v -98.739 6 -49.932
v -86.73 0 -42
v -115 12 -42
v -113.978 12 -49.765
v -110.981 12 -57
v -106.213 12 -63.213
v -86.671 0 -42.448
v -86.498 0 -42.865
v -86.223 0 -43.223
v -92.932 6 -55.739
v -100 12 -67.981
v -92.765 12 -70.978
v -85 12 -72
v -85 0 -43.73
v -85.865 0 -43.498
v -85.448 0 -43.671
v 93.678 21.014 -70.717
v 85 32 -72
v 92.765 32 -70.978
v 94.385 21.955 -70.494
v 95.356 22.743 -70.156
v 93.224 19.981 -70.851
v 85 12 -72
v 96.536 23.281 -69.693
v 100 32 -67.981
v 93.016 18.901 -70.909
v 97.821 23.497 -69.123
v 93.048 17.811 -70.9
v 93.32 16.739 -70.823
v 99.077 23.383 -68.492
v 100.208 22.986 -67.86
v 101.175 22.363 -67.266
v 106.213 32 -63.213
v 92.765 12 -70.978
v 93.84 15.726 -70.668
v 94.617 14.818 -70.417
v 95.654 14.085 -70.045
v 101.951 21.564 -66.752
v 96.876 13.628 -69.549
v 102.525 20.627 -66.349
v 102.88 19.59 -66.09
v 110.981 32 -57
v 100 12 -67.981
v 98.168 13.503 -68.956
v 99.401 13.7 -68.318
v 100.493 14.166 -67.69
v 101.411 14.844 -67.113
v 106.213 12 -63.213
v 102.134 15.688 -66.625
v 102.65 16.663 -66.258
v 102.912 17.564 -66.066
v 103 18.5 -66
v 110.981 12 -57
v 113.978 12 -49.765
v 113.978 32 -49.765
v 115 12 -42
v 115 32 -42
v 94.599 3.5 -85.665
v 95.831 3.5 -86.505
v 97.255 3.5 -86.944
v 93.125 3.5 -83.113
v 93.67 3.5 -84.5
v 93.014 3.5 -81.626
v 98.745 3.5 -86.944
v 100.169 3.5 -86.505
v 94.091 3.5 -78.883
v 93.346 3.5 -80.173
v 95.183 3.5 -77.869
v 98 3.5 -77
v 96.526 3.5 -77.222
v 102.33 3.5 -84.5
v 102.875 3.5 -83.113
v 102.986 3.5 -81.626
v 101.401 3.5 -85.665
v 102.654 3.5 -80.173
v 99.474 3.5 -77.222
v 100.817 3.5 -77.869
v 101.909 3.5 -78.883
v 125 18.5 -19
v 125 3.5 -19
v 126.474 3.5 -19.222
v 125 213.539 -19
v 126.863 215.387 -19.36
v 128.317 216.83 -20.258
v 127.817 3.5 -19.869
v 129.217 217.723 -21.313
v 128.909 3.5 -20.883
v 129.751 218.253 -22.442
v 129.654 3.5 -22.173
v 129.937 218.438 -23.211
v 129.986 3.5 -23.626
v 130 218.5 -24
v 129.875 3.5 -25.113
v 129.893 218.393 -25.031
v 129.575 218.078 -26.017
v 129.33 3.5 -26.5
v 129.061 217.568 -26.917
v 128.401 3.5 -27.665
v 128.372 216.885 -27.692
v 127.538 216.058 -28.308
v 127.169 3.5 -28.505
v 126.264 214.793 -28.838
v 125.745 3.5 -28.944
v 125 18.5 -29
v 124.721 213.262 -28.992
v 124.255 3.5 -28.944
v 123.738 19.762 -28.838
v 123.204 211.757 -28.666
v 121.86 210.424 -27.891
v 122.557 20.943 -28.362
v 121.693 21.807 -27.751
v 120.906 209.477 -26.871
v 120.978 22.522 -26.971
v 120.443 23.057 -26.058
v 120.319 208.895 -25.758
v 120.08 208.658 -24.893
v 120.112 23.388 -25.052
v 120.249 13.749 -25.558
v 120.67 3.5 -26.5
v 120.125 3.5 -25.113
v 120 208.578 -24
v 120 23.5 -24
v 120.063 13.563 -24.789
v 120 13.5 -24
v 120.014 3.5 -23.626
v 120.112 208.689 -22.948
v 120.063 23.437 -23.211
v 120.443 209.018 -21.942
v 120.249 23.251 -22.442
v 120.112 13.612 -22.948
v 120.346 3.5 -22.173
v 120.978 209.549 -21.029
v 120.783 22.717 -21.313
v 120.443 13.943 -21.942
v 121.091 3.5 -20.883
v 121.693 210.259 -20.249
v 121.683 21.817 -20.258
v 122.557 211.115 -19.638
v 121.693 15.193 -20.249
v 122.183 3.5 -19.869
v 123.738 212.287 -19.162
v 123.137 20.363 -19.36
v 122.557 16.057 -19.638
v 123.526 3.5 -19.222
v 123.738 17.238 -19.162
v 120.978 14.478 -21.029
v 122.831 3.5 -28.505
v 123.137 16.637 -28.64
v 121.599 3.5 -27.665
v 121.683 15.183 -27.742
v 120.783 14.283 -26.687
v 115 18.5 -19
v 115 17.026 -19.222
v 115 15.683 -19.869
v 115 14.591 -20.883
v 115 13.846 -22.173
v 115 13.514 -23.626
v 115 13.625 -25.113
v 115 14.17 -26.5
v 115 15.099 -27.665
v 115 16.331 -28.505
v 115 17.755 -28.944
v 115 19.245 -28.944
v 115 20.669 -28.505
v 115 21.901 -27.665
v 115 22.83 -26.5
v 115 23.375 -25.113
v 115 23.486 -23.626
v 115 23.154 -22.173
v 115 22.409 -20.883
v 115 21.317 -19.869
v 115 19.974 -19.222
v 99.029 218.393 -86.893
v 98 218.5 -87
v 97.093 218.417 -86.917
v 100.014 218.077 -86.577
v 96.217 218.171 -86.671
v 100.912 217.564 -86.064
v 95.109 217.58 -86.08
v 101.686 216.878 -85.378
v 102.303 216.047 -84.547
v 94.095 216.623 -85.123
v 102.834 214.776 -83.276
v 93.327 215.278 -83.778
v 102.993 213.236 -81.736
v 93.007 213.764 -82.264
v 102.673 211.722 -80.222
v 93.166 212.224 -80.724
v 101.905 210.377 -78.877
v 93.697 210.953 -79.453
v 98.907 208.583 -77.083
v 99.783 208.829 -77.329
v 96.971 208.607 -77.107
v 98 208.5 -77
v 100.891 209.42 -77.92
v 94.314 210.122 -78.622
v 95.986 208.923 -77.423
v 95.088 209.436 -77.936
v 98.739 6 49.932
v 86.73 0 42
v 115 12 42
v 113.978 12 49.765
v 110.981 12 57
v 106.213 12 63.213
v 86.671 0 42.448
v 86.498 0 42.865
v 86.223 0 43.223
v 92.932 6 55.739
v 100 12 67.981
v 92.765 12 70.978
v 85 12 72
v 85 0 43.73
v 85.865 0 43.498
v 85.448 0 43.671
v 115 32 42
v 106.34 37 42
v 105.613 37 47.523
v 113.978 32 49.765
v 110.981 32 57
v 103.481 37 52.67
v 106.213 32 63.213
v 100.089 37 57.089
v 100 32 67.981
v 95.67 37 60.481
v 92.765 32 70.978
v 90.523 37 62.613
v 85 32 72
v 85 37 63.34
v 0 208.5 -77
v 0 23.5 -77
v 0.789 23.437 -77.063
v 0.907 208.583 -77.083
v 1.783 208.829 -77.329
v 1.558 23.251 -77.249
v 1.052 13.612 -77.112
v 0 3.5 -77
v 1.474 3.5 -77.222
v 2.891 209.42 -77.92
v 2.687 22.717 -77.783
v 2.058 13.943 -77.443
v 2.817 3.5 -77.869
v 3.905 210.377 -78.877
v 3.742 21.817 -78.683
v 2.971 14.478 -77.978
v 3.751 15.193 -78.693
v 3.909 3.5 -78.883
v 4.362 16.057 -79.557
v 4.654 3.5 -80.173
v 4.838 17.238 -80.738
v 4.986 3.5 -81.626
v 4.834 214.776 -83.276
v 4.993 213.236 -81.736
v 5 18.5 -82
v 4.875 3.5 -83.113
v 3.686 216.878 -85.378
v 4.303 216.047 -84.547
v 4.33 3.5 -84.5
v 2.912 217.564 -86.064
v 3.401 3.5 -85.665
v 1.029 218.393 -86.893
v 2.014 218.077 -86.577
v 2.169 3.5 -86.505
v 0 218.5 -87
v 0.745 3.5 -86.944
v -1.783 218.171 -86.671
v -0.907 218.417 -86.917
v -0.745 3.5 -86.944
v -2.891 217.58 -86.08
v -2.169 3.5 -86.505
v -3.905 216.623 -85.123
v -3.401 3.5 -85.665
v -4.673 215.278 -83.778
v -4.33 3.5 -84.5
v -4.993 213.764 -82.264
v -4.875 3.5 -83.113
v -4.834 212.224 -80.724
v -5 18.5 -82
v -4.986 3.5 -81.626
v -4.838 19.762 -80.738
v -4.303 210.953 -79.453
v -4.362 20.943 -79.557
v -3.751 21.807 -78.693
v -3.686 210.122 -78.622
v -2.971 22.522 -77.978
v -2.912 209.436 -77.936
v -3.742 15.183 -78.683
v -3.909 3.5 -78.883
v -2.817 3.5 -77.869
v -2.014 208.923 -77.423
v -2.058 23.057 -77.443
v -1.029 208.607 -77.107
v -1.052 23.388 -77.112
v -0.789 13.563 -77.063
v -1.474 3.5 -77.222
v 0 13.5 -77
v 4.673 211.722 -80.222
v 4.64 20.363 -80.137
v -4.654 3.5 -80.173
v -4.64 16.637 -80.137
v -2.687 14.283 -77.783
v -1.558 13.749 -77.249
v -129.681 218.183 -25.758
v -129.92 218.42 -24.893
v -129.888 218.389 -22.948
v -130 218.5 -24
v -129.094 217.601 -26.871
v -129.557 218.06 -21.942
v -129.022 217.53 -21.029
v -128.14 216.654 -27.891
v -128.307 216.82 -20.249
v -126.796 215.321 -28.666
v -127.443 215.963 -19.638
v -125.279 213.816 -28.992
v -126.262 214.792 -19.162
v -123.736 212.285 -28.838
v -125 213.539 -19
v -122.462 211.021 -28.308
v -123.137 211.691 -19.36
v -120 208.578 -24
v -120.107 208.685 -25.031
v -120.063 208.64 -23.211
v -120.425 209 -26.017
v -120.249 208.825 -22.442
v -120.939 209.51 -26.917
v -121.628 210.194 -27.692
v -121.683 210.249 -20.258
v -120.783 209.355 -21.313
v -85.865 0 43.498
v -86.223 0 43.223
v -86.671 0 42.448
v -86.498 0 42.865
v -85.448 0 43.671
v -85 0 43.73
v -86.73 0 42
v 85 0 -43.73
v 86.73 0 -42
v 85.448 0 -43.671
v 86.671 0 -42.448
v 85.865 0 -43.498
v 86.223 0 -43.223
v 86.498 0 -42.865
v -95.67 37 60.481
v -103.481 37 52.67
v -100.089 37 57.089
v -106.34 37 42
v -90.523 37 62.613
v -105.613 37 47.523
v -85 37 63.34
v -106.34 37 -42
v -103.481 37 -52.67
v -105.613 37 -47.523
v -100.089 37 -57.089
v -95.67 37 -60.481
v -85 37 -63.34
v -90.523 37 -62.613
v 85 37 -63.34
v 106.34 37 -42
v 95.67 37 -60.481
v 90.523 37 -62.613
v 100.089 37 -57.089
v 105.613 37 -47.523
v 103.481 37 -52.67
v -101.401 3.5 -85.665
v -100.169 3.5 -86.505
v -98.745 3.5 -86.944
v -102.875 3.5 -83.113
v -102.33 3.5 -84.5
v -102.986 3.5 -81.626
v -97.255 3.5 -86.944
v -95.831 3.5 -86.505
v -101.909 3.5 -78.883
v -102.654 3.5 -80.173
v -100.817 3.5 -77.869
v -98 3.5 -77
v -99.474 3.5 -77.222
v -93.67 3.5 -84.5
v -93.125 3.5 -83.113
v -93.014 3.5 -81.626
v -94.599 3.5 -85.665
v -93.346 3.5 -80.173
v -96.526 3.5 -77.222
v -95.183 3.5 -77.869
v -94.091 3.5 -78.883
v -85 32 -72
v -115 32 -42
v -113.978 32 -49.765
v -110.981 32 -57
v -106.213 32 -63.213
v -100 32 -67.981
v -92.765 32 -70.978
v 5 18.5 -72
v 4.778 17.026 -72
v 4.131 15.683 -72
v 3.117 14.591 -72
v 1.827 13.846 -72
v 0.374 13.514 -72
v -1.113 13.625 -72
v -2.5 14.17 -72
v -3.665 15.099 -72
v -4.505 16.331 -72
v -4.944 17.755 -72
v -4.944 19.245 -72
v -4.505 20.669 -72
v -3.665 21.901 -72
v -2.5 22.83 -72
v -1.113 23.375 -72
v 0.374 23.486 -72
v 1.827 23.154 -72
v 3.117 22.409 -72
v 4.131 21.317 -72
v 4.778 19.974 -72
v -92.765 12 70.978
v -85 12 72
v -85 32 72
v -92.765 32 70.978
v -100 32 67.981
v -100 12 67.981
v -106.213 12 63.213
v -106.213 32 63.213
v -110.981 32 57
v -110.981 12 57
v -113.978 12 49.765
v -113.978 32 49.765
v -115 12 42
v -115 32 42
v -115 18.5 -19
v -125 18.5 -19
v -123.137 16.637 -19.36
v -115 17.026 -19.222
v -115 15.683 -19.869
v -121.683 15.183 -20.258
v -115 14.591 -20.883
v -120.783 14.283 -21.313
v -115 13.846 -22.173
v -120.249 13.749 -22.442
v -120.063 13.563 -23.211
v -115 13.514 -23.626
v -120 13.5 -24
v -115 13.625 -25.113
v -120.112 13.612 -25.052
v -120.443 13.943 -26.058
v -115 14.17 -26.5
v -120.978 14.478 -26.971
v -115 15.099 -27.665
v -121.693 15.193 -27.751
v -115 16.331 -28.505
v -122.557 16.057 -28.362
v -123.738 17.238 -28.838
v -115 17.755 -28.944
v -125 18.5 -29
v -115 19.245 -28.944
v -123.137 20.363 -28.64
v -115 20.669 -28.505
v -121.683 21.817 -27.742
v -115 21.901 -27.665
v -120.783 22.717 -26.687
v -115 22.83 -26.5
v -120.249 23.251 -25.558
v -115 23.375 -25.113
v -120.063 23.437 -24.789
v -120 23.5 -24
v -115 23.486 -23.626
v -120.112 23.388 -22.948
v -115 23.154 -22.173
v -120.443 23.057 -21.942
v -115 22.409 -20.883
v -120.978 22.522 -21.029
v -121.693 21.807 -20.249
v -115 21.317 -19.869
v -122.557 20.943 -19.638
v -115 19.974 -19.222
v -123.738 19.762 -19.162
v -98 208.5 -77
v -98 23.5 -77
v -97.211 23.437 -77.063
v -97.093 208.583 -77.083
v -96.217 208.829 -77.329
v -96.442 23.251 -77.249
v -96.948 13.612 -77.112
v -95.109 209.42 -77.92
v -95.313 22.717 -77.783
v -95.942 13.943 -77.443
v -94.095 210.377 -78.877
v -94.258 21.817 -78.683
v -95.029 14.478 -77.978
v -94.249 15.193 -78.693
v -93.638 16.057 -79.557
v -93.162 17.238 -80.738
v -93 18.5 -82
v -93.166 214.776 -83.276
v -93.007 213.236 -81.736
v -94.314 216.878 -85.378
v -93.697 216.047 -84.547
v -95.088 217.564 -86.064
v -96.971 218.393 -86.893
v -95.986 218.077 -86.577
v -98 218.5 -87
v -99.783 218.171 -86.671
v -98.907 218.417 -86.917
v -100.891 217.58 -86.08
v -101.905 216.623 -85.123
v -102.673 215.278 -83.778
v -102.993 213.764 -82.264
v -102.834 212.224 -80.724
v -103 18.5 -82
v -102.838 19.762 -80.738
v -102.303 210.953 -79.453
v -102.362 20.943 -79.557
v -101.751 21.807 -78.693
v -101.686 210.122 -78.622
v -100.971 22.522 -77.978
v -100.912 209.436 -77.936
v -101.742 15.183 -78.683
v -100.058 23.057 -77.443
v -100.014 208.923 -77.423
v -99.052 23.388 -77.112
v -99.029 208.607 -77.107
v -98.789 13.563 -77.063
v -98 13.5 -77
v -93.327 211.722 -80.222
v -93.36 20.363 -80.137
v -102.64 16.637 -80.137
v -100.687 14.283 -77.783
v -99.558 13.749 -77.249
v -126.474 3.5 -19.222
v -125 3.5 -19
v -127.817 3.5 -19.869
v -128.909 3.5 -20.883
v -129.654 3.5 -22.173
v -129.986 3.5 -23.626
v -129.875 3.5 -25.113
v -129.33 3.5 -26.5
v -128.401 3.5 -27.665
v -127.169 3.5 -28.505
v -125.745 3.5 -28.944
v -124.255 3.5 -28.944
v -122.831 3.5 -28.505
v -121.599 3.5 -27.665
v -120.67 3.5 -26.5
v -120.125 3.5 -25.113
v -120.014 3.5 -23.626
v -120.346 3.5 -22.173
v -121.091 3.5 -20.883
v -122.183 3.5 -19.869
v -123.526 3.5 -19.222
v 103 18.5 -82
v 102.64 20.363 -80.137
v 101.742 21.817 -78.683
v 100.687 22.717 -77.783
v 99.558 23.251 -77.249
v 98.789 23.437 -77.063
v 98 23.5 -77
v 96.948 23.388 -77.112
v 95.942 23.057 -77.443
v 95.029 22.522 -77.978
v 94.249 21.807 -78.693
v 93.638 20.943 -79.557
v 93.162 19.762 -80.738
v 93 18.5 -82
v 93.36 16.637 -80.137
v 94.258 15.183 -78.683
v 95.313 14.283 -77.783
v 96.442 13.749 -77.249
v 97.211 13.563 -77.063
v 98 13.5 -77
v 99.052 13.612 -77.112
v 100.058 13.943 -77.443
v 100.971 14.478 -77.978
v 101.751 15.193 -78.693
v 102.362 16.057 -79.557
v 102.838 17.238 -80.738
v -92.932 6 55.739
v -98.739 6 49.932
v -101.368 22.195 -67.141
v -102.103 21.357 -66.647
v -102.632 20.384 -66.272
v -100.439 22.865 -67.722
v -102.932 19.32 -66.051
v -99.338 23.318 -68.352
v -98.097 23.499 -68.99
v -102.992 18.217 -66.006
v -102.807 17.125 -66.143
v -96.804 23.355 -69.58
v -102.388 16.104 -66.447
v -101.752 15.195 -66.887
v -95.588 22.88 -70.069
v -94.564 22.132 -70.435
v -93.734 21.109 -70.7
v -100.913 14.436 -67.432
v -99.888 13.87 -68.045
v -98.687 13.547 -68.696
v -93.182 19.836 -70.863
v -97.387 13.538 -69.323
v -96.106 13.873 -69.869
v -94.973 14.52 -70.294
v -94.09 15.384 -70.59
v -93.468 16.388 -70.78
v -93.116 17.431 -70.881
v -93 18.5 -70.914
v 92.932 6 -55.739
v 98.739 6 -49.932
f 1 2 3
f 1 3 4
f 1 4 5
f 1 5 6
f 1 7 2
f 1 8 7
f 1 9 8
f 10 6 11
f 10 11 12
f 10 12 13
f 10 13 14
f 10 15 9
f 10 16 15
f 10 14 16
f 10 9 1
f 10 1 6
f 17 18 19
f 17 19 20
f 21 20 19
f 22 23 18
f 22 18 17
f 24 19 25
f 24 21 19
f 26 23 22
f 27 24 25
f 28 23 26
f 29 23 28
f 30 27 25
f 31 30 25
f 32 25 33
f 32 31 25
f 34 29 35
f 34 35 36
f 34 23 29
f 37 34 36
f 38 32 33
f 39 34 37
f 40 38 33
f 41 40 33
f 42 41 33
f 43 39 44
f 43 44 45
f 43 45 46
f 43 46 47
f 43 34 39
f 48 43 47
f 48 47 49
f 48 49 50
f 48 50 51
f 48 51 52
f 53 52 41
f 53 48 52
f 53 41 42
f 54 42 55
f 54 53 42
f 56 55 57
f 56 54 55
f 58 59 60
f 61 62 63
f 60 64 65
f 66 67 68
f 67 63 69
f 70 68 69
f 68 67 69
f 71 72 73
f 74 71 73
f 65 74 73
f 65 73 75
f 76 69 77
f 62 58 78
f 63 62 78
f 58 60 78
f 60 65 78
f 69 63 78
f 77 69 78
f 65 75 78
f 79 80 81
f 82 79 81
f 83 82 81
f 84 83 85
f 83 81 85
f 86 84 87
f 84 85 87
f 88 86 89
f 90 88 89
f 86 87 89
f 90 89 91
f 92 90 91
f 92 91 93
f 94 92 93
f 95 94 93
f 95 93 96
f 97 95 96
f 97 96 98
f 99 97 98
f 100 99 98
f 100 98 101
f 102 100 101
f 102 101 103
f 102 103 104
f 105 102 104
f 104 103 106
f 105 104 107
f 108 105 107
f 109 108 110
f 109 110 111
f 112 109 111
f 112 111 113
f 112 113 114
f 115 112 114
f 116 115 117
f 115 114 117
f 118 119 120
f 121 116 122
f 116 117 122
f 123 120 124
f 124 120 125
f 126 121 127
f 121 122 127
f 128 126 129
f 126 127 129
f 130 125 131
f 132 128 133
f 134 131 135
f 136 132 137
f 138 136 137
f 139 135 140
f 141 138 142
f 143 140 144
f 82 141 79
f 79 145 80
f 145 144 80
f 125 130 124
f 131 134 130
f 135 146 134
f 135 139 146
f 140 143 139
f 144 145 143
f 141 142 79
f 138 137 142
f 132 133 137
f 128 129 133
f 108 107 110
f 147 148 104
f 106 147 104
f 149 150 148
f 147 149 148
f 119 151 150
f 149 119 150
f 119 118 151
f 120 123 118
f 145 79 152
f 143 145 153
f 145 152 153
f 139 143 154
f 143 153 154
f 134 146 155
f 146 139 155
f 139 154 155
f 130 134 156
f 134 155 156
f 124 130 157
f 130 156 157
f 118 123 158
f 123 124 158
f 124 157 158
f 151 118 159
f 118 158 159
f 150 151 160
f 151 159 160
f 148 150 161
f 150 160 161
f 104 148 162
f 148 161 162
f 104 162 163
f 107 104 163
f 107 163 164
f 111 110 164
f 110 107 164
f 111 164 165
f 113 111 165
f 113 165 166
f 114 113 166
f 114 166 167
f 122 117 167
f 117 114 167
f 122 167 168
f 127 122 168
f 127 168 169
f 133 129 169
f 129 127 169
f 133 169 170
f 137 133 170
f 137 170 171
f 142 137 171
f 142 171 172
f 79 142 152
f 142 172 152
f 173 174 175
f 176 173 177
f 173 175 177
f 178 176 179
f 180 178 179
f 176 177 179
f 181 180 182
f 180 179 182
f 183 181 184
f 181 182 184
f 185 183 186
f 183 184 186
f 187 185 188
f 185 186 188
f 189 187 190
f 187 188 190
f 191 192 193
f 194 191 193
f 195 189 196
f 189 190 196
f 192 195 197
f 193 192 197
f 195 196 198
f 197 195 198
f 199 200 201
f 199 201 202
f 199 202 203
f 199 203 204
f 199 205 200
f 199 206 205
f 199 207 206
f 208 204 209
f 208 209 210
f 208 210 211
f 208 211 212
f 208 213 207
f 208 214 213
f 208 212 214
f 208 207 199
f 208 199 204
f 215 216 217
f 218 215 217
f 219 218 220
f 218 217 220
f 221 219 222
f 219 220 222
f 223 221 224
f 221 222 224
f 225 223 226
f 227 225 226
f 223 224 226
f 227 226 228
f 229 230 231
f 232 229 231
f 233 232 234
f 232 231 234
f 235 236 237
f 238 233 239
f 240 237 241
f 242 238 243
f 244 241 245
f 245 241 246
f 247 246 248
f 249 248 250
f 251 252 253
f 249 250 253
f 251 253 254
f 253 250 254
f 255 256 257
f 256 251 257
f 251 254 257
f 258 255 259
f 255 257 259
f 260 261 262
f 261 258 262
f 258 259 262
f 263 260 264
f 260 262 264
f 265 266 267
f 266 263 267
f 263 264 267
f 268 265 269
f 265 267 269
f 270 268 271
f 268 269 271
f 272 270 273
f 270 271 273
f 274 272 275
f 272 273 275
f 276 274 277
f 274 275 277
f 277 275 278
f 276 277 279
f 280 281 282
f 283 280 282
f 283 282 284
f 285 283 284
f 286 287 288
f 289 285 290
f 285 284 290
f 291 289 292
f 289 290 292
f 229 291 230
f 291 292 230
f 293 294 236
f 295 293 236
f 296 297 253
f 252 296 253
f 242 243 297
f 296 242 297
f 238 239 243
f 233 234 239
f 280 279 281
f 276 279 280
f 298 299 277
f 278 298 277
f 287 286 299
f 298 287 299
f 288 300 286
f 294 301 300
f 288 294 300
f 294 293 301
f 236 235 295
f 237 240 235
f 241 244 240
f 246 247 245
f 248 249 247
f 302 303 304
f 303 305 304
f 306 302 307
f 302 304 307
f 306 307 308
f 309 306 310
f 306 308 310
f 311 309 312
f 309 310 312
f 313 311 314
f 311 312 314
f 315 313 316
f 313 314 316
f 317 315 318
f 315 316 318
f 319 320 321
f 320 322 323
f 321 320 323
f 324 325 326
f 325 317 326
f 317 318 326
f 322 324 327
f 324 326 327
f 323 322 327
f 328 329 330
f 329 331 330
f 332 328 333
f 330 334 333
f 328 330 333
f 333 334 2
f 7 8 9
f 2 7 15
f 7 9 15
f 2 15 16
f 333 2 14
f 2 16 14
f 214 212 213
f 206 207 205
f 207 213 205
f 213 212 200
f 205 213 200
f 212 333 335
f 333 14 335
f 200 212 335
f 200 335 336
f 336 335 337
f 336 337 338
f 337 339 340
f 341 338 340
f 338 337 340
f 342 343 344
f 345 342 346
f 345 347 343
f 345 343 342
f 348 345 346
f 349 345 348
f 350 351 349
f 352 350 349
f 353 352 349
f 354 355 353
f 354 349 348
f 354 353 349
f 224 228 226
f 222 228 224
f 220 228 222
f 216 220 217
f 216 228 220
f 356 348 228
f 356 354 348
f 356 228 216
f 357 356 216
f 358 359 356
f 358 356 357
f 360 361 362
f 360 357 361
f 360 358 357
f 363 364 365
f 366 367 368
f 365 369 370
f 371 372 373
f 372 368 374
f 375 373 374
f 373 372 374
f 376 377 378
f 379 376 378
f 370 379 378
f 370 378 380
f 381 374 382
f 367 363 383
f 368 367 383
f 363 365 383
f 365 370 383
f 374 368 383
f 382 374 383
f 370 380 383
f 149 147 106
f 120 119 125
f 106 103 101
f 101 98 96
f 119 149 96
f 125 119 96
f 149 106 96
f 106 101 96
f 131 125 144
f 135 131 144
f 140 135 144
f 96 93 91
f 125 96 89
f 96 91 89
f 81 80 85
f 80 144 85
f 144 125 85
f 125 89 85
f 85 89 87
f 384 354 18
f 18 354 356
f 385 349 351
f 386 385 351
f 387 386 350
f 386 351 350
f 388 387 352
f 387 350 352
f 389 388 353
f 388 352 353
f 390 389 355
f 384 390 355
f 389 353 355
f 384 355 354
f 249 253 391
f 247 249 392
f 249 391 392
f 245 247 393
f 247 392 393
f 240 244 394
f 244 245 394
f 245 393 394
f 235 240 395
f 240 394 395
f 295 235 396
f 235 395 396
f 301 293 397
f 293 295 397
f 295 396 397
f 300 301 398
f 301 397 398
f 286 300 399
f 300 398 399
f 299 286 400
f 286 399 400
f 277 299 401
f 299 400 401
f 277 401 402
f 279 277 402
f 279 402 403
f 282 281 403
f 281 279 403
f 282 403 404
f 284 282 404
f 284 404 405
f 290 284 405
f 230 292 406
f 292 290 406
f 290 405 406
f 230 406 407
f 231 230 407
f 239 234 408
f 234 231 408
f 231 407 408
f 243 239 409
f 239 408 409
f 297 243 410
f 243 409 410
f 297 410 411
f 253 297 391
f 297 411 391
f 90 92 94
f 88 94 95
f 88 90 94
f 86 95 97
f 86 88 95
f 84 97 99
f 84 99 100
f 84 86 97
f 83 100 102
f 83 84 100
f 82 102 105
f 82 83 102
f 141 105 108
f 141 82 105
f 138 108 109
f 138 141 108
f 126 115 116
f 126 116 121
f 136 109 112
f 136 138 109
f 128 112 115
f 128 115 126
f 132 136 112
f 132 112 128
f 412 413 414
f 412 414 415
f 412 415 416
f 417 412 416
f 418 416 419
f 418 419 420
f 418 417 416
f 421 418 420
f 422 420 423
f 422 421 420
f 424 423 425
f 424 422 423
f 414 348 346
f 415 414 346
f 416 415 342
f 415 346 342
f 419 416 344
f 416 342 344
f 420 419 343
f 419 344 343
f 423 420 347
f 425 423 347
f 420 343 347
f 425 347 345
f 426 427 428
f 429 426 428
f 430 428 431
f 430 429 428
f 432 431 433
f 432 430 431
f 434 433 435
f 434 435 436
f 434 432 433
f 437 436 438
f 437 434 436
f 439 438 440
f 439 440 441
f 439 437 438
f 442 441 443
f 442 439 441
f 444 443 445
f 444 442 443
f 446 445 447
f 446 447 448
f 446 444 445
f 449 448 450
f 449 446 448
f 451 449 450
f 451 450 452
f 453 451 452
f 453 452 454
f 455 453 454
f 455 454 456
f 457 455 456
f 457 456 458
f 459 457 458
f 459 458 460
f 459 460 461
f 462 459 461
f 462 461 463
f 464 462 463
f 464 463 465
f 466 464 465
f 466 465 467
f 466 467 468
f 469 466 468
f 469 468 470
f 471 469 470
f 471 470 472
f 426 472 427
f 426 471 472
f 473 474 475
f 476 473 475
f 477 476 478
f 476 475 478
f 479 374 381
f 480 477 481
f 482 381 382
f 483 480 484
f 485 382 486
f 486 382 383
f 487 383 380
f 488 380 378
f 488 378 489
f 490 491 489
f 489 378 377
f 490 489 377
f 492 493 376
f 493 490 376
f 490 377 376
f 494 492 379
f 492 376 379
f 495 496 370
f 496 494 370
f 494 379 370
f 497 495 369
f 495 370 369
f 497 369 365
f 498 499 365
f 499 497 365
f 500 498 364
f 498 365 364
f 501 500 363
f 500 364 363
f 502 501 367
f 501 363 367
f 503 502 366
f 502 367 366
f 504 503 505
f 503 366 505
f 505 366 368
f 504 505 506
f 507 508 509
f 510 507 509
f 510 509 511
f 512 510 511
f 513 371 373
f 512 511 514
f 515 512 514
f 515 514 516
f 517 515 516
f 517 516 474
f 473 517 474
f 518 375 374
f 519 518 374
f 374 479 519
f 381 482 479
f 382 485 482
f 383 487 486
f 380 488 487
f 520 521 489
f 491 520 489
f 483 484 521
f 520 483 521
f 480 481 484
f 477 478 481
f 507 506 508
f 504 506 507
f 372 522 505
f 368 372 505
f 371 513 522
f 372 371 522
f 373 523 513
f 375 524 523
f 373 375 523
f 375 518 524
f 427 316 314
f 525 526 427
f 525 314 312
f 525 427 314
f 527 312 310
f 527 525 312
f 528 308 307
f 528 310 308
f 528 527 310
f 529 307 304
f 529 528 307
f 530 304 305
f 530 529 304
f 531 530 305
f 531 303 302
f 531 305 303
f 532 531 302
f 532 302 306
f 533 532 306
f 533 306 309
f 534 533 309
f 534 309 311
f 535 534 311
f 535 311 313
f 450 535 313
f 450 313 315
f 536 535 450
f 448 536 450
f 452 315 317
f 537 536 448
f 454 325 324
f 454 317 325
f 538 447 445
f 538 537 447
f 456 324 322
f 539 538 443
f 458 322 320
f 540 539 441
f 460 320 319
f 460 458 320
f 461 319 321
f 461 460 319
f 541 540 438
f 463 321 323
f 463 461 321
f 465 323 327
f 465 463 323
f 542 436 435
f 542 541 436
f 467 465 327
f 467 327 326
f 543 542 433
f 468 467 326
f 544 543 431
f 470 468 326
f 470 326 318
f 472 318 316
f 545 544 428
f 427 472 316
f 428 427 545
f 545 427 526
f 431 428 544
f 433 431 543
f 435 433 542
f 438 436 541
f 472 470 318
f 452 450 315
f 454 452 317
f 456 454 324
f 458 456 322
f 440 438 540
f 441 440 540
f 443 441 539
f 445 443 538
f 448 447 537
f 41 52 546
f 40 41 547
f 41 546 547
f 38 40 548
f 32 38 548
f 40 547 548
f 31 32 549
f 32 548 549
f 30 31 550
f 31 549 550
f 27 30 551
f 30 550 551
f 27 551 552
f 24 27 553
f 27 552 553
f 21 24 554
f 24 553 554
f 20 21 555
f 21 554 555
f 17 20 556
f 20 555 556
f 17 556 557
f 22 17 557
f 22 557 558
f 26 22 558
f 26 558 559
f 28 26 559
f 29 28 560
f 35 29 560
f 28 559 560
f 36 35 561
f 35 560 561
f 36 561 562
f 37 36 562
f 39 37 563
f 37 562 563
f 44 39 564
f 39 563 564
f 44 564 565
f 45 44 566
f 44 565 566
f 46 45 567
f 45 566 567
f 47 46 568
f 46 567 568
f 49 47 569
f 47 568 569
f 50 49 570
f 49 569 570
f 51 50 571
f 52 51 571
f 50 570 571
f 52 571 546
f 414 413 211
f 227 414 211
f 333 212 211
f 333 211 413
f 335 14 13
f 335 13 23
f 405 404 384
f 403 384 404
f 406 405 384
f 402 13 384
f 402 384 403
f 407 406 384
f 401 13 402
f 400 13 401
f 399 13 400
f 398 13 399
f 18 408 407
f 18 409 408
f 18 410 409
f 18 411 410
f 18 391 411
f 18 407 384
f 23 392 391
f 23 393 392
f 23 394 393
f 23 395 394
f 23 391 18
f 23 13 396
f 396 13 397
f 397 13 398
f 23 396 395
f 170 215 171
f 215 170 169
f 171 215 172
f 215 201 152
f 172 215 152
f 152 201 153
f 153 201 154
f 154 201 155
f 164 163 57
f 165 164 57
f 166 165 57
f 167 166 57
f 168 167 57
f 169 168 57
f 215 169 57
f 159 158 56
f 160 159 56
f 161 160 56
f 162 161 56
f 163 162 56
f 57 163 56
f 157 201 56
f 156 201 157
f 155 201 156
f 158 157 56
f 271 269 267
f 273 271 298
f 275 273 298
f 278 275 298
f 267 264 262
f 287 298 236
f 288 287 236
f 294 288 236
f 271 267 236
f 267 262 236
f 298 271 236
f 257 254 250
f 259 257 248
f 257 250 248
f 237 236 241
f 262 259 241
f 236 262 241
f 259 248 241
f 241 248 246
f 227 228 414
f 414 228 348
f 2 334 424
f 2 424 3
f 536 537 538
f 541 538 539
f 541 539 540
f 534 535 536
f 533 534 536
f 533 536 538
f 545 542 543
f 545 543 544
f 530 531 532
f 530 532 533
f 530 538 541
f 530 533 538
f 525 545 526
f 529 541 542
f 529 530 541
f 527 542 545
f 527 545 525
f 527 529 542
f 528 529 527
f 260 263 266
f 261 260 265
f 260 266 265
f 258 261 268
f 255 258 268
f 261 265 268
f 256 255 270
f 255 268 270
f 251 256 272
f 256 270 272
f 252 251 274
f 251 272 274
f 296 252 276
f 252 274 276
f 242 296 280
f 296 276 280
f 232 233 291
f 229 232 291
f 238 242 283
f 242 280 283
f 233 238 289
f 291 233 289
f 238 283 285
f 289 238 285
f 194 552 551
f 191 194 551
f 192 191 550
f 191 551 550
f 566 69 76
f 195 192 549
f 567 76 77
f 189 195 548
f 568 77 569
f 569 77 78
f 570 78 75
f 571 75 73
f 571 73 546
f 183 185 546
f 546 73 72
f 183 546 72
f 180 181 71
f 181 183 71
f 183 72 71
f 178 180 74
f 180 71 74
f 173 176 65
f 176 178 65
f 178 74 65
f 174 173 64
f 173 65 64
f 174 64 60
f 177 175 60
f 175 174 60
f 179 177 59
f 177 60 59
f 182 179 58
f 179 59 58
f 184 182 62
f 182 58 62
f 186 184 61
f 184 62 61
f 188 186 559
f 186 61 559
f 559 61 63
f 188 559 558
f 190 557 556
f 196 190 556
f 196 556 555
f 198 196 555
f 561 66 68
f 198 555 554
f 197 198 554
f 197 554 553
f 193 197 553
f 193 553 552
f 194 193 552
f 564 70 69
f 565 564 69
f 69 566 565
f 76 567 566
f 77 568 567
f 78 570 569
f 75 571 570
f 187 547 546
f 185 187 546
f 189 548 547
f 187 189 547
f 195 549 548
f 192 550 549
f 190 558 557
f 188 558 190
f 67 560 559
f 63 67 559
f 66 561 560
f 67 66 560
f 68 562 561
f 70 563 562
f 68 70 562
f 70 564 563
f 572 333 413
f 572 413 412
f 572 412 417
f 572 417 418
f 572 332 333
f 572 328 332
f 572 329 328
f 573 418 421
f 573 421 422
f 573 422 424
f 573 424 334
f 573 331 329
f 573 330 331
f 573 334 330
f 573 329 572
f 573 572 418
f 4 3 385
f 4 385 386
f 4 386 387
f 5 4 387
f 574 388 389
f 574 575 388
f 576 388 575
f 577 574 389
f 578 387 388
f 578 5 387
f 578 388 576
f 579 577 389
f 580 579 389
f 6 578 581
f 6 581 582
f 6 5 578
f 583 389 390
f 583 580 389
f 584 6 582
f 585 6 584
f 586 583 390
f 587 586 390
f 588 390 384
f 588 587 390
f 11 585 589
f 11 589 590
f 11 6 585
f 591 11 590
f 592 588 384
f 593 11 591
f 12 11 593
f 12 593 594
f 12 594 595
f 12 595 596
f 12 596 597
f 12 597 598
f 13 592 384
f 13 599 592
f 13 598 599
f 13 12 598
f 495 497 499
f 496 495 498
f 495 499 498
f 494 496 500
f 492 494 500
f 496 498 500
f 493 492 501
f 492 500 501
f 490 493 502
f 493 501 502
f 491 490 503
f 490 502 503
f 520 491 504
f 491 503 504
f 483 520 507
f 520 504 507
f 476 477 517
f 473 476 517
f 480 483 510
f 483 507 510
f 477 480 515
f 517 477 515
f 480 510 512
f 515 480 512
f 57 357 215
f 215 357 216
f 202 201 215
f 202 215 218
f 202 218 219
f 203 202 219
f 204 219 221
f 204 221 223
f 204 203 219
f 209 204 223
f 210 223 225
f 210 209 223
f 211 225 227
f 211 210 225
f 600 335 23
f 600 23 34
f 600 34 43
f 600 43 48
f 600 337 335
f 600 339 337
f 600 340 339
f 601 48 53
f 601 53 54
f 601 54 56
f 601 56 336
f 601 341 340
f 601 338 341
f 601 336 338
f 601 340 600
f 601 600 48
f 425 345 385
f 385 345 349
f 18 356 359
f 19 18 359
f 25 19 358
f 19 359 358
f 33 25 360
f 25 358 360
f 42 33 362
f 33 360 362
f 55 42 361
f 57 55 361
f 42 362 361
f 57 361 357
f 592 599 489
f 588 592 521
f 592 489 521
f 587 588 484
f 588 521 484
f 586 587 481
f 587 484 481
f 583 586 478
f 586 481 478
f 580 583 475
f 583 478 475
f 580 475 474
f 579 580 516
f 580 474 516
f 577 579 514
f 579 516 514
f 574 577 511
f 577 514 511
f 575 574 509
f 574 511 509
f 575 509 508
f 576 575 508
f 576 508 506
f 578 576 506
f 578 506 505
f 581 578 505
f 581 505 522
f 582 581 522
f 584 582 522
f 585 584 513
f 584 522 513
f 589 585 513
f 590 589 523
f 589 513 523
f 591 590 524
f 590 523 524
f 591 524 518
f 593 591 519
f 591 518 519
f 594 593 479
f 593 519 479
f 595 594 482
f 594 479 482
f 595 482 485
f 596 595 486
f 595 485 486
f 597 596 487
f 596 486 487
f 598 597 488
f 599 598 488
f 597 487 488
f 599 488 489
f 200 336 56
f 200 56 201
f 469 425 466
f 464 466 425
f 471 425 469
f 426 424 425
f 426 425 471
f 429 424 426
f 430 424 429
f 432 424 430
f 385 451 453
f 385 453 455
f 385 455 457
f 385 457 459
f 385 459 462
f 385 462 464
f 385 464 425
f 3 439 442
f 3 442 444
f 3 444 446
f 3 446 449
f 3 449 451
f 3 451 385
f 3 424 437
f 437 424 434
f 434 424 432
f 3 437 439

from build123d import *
from OCP.BRepFilletAPI import BRepFilletAPI_MakeChamfer

# Parameters (mm, degrees)
ESBO_O1_W                     = 230
ESBO_O1_H                     = 144
RESSALTO_EXTRUS_O1_DEPTH      = 37
ESBO_O2_R                     = 5
RESSALTO_EXTRUS_O2_DEPTH      = 10
RESSALTO_EXTRUS_O3_START      = -15
ESBO_O3_R                     = 5
RESSALTO_EXTRUS_O3_DEPTH      = 215
CORTE_EXTRUS_O1_DEPTH         = 56
ESBO_O6_R                     = 5
RESSALTO_EXTRUS_O4_DEPTH      = 10
RESSALTO_EXTRUS_O5_DEPTH      = 200
RESSALTO_EXTRUS_O5_DEPTH_BACK = 15
ESBO_O7_R                     = 5
CORTE_EXTRUS_O2_DEPTH         = 200
CORTE_EXTRUS_O2_DEPTH_BACK    = 200
FILETE1_START                 = -1
FILETE1_DEPTH                 = 39
FILETE1_START_2               = 23.5000001
FILETE1_2_DEPTH               = 14.4999999
FILETE1_3_DEPTH               = 14.499999761
FILETE1_START_3               = 23.281176651
FILETE1_4_DEPTH               = 9.810883349
FILETE1_START_4               = 13.499999761
FILETE1_5_DEPTH               = 9.78117689
FILETE1_6_DEPTH               = 0.218823449
FILETE1_START_5               = -72
FILETE1_7_OUTLINE_R           = 5
FILETE1_7_DEPTH               = 30
CHANFRO1_SIZE                 = 5
CHANFRO1_SIZE2                = 8.660254038
CHANFRO2_SIZE                 = 12
CHANFRO2_SIZE2                = 28.27022839


with BuildPart() as part:
    # Esboço1 → Ressalto-extrusão1 (new body)
    with BuildSketch(Plane(origin=(0, 0, 0), x_dir=(1, 0, 0), z_dir=(0, 1, 0))):
        Rectangle(ESBO_O1_W, ESBO_O1_H)
    extrude(amount=RESSALTO_EXTRUS_O1_DEPTH)

    # Esboço2 → Ressalto-extrusão2 (add)
    with BuildSketch(Plane(origin=(115, 0, 0), x_dir=(0, 0, -1), z_dir=(1, 0, 0))):
        with Locations(Location((24, 18.5, 0), (0, 0, 180))):
            Circle(ESBO_O2_R)
    ressalto_extrus_o2 = extrude(amount=RESSALTO_EXTRUS_O2_DEPTH)

    # Esboço3 → Ressalto-extrusão3 (add)
    with BuildSketch(Plane(origin=(0, 18.5, 0), x_dir=(1, 0, 0), z_dir=(0, 1, 0)).offset(RESSALTO_EXTRUS_O3_START)):
        with Locations(Location((125, 24, 0), (0, 0, 270))):
            Circle(ESBO_O3_R)
    ressalto_extrus_o3 = extrude(amount=RESSALTO_EXTRUS_O3_DEPTH)

    # Esboço4 → Corte-extrusão1 (cut)
    with BuildSketch(Plane.XY):
        Polygon((130, 218.5), (120, 208.57834268), (120, 218.5), align=None)
    corte_extrus_o1 = extrude(amount=-CORTE_EXTRUS_O1_DEPTH, mode=Mode.SUBTRACT)

    # Espelhar1: Ressalto-extrusão2, Ressalto-extrusão3, Corte-extrusão1 across plane
    add(ressalto_extrus_o2.mirror(Plane(origin=(0, 0, 0), x_dir=(0, 0, 1), z_dir=(1, 0, 0))))
    add(ressalto_extrus_o3.mirror(Plane(origin=(0, 0, 0), x_dir=(0, 0, 1), z_dir=(1, 0, 0))))
    add(corte_extrus_o1.mirror(Plane(origin=(0, 0, 0), x_dir=(0, 0, 1), z_dir=(1, 0, 0))), mode=Mode.SUBTRACT)

    # Esboço6 → Ressalto-extrusão4 (add)
    with BuildSketch(Plane(origin=(0, 0, -72), x_dir=(-1, 0, 0), z_dir=(0, 0, -1))):
        with Locations(Location((-98, 18.5, 0), (0, 0, 180))):
            Circle(ESBO_O6_R)
        with Locations(Location((0, 18.5, 0), (0, 0, 180))):
            Circle(ESBO_O6_R)
        with Locations(Location((98, 18.5, 0), (0, 0, 180))):
            Circle(ESBO_O6_R)
    extrude(amount=RESSALTO_EXTRUS_O4_DEPTH)

    # Esboço7 → Ressalto-extrusão5 (add, two sides: drawn at the far end of the back side and taken through both)
    with BuildSketch(Plane(origin=(0, 18.5, 0), x_dir=(1, 0, 0), z_dir=(0, 1, 0)).offset(-RESSALTO_EXTRUS_O5_DEPTH_BACK)):
        with Locations(Location((-98, 82, 0), (0, 0, 270))):
            Circle(ESBO_O7_R)
        with Locations(Location((0, 82, 0), (0, 0, 270))):
            Circle(ESBO_O7_R)
        with Locations(Location((98, 82, 0), (0, 0, 270))):
            Circle(ESBO_O7_R)
    extrude(amount=RESSALTO_EXTRUS_O5_DEPTH + RESSALTO_EXTRUS_O5_DEPTH_BACK)

    # Esboço8 → Corte-extrusão2 (cut, two sides: drawn at the far end of the back side and taken through both)
    with BuildSketch(Plane(origin=(0, 0, 0), x_dir=(0, 0, -1), z_dir=(1, 0, 0)).offset(-CORTE_EXTRUS_O2_DEPTH_BACK)):
        Polygon((87, 218.5), (77, 208.5), (77, 218.5), align=None)
    extrude(amount=CORTE_EXTRUS_O2_DEPTH + CORTE_EXTRUS_O2_DEPTH_BACK, mode=Mode.SUBTRACT)

    # Filete1: read off the stored shape, not the designer's step
    # Filete1 outline → Filete1 (cut)
    with BuildSketch(Plane(origin=(0, 0, 0), x_dir=(1, 0, 0), z_dir=(0, 1, 0)).offset(FILETE1_START)):
        with BuildLine():
            ThreePointArc((-85, -72), (-106.213203436, -63.213203436), (-115, -42))
            Line((-115, -42), (-115, -72))
            Line((-115, -72), (-85, -72))
        make_face()
        with BuildLine():
            ThreePointArc((115, -42), (106.213203436, -63.213203436), (85, -72))
            Line((85, -72), (115, -72))
            Line((115, -72), (115, -42))
        make_face()
    extrude(amount=FILETE1_DEPTH, mode=Mode.SUBTRACT)

    # Filete1 2 outline → Filete1 2 (cut)
    with BuildSketch(Plane(origin=(0, 0, 0), x_dir=(1, 0, 0), z_dir=(0, 1, 0)).offset(FILETE1_START_2)):
        with BuildLine():
            Line((-115, 72), (-115, 42))
            ThreePointArc((-115, 42), (-106.213203436, 63.213203436), (-85, 72))
            Line((-85, 72), (-115, 72))
        make_face()
        with BuildLine():
            Line((115, 72), (85, 72))
            ThreePointArc((85, 72), (106.213203436, 63.213203436), (115, 42))
            Line((115, 42), (115, 72))
        make_face()
    extrude(amount=FILETE1_2_DEPTH, mode=Mode.SUBTRACT)

    # Filete1 3 outline → Filete1 3 (cut)
    with BuildSketch(Plane(origin=(0, 0, 0), x_dir=(1, 0, 0), z_dir=(0, 1, 0)).offset(FILETE1_START)):
        with BuildLine():
            Line((-115, 72), (-115, 42))
            ThreePointArc((-115, 42), (-106.213203436, 63.213203436), (-85, 72))
            Line((-85, 72), (-115, 72))
        make_face()
        with BuildLine():
            Line((115, 72), (85, 72))
            ThreePointArc((85, 72), (106.213203436, 63.213203436), (115, 42))
            Line((115, 42), (115, 72))
        make_face()
    extrude(amount=FILETE1_3_DEPTH, mode=Mode.SUBTRACT)

    # Filete1 4 outline → Filete1 4 (cut)
    with BuildSketch(Plane(origin=(0, 0, 0), x_dir=(1, 0, 0), z_dir=(0, 1, 0)).offset(FILETE1_START_3)):
        with BuildLine():
            Line((115, 72), (85, 72))
            ThreePointArc((85, 72), (106.213203436, 63.213203436), (115, 42))
            Line((115, 42), (115, 72))
        make_face()
    extrude(amount=FILETE1_4_DEPTH, mode=Mode.SUBTRACT)

    # Filete1 5 outline → Filete1 5 (cut)
    with BuildSketch(Plane(origin=(0, 0, 0), x_dir=(1, 0, 0), z_dir=(0, 1, 0)).offset(FILETE1_START_4)):
        with BuildLine():
            Line((-115, 72), (-115, 42))
            ThreePointArc((-115, 42), (-106.213203436, 63.213203436), (-85, 72))
            Line((-85, 72), (-115, 72))
        make_face()
        with BuildLine():
            Line((115, 72), (85, 72))
            ThreePointArc((85, 72), (106.213203436, 63.213203436), (115, 42))
            Line((115, 42), (115, 72))
        make_face()
    extrude(amount=FILETE1_5_DEPTH, mode=Mode.SUBTRACT)

    # Filete1 6 outline → Filete1 6 (cut)
    with BuildSketch(Plane(origin=(0, 0, 0), x_dir=(1, 0, 0), z_dir=(0, 1, 0)).offset(FILETE1_START_3)):
        with BuildLine():
            Line((-115, 72), (-115, 42))
            ThreePointArc((-115, 42), (-106.213203436, 63.213203436), (-85, 72))
            Line((-85, 72), (-115, 72))
        make_face()
    extrude(amount=FILETE1_6_DEPTH, mode=Mode.SUBTRACT)

    # Filete1 7 outline → Filete1 7 (add)
    with BuildSketch(Plane.XY.offset(FILETE1_START_5)):
        with Locations((98, 18.5)):
            Circle(FILETE1_7_OUTLINE_R)
        with Locations((-98, 18.5)):
            Circle(FILETE1_7_OUTLINE_R)
    extrude(amount=FILETE1_7_DEPTH)

    # Chanfro1: one chamfer whose edges measure the first distance from different faces: ONE call of the kernel's chamfer builder (chamfer() names one face for all edges)
    chanfro1_edges_1 = [part.edges().sort_by_distance(p)[0] for p in [
        (-115, 37, 0),
    ]]
    chanfro1_side_1 = [part.faces().sort_by_distance(p)[0] for p in [
        (-115, 18.5, 0.622208406),
    ]]
    chanfro1_edges_2 = [part.edges().sort_by_distance(p)[0] for p in [
        (0, 37, -72),
    ]]
    chanfro1_side_2 = [part.faces().sort_by_distance(p)[0] for p in [
        (0, 1.739798839, -72),
    ]]
    chanfro1_edges_3 = [part.edges().sort_by_distance(p)[0] for p in [
        (0, 37, 72),
    ]]
    chanfro1_side_3 = [part.faces().sort_by_distance(p)[0] for p in [
        (0, 18.5, 72),
    ]]
    chanfro1_edges_4 = [part.edges().sort_by_distance(p)[0] for p in [
        (115, 37, 0),
    ]]
    chanfro1_side_4 = [part.faces().sort_by_distance(p)[0] for p in [
        (115, 18.5, 0.622208406),
    ]]
    chanfro1_edges_5 = [part.edges().sort_by_distance(p)[0] for p in [
        (-106.213203436, 37, 63.213203436),
    ]]
    chanfro1_side_5 = [part.faces().sort_by_distance(p)[0] for p in [
        (-106.213203436, 18.5, 63.213203436),
    ]]
    chanfro1_edges_6 = [part.edges().sort_by_distance(p)[0] for p in [
        (106.213203436, 37, 63.213203436),
    ]]
    chanfro1_side_6 = [part.faces().sort_by_distance(p)[0] for p in [
        (106.213203436, 18.5, 63.213203436),
    ]]
    chanfro1_edges_7 = [part.edges().sort_by_distance(p)[0] for p in [
        (106.213203436, 37, -63.213203436),
    ]]
    chanfro1_side_7 = [part.faces().sort_by_distance(p)[0] for p in [
        (106.213203436, 18.5, -63.213203436),
    ]]
    chanfro1_edges_8 = [part.edges().sort_by_distance(p)[0] for p in [
        (-106.213203436, 37, -63.213203436),
    ]]
    chanfro1_side_8 = [part.faces().sort_by_distance(p)[0] for p in [
        (-106.213203436, 18.5, -63.213203436),
    ]]
    chanfro1 = BRepFilletAPI_MakeChamfer(part.part.solid().wrapped)
    for e in chanfro1_edges_1:
        chanfro1.Add(CHANFRO1_SIZE, CHANFRO1_SIZE2, e.wrapped, chanfro1_side_1[0].wrapped)  # the first distance lies on this face
    for e in chanfro1_edges_2:
        chanfro1.Add(CHANFRO1_SIZE, CHANFRO1_SIZE2, e.wrapped, chanfro1_side_2[0].wrapped)  # the first distance lies on this face
    for e in chanfro1_edges_3:
        chanfro1.Add(CHANFRO1_SIZE, CHANFRO1_SIZE2, e.wrapped, chanfro1_side_3[0].wrapped)  # the first distance lies on this face
    for e in chanfro1_edges_4:
        chanfro1.Add(CHANFRO1_SIZE, CHANFRO1_SIZE2, e.wrapped, chanfro1_side_4[0].wrapped)  # the first distance lies on this face
    for e in chanfro1_edges_5:
        chanfro1.Add(CHANFRO1_SIZE, CHANFRO1_SIZE2, e.wrapped, chanfro1_side_5[0].wrapped)  # the first distance lies on this face
    for e in chanfro1_edges_6:
        chanfro1.Add(CHANFRO1_SIZE, CHANFRO1_SIZE2, e.wrapped, chanfro1_side_6[0].wrapped)  # the first distance lies on this face
    for e in chanfro1_edges_7:
        chanfro1.Add(CHANFRO1_SIZE, CHANFRO1_SIZE2, e.wrapped, chanfro1_side_7[0].wrapped)  # the first distance lies on this face
    for e in chanfro1_edges_8:
        chanfro1.Add(CHANFRO1_SIZE, CHANFRO1_SIZE2, e.wrapped, chanfro1_side_8[0].wrapped)  # the first distance lies on this face
    add(Compound.cast(chanfro1.Shape()), mode=Mode.REPLACE)

    # Chanfro2: one chamfer whose edges measure the first distance from different faces: ONE call of the kernel's chamfer builder (chamfer() names one face for all edges)
    chanfro2_edges_1 = [part.edges().sort_by_distance(p)[0] for p in [
        (-115, 0, 0),
    ]]
    chanfro2_side_1 = [part.faces().sort_by_distance(p)[0] for p in [
        (-115, 15.924754728, 0.72235461),
    ]]
    chanfro2_edges_2 = [part.edges().sort_by_distance(p)[0] for p in [
        (0, 0, -72),
    ]]
    chanfro2_side_2 = [part.faces().sort_by_distance(p)[0] for p in [
        (83.270144515, 16, -72),
    ]]
    chanfro2_edges_3 = [part.edges().sort_by_distance(p)[0] for p in [
        (115, 0, 0),
    ]]
    chanfro2_side_3 = [part.faces().sort_by_distance(p)[0] for p in [
        (115, 15.924754728, 0.72235461),
    ]]
    chanfro2_edges_4 = [part.edges().sort_by_distance(p)[0] for p in [
        (0, 0, 72),
    ]]
    chanfro2_side_4 = [part.faces().sort_by_distance(p)[0] for p in [
        (0, 16, 72),
    ]]
    chanfro2_edges_5 = [part.edges().sort_by_distance(p)[0] for p in [
        (-106.213203436, 0, 63.213203436),
    ]]
    chanfro2_side_5 = [part.faces().sort_by_distance(p)[0] for p in [
        (-106.213203436, 16, 63.213203436),
    ]]
    chanfro2_edges_6 = [part.edges().sort_by_distance(p)[0] for p in [
        (106.213203436, 0, 63.213203436),
    ]]
    chanfro2_side_6 = [part.faces().sort_by_distance(p)[0] for p in [
        (106.213203436, 16, 63.213203436),
    ]]
    chanfro2_edges_7 = [part.edges().sort_by_distance(p)[0] for p in [
        (106.213203436, 0, -63.213203436),
    ]]
    chanfro2_side_7 = [part.faces().sort_by_distance(p)[0] for p in [
        (106.213203436, 16, -63.213203436),
    ]]
    chanfro2_edges_8 = [part.edges().sort_by_distance(p)[0] for p in [
        (-106.213203436, 0, -63.213203436),
    ]]
    chanfro2_side_8 = [part.faces().sort_by_distance(p)[0] for p in [
        (-106.213203436, 16, -63.213203436),
    ]]
    chanfro2 = BRepFilletAPI_MakeChamfer(part.part.solid().wrapped)
    for e in chanfro2_edges_1:
        chanfro2.Add(CHANFRO2_SIZE, CHANFRO2_SIZE2, e.wrapped, chanfro2_side_1[0].wrapped)  # the first distance lies on this face
    for e in chanfro2_edges_2:
        chanfro2.Add(CHANFRO2_SIZE, CHANFRO2_SIZE2, e.wrapped, chanfro2_side_2[0].wrapped)  # the first distance lies on this face
    for e in chanfro2_edges_3:
        chanfro2.Add(CHANFRO2_SIZE, CHANFRO2_SIZE2, e.wrapped, chanfro2_side_3[0].wrapped)  # the first distance lies on this face
    for e in chanfro2_edges_4:
        chanfro2.Add(CHANFRO2_SIZE, CHANFRO2_SIZE2, e.wrapped, chanfro2_side_4[0].wrapped)  # the first distance lies on this face
    for e in chanfro2_edges_5:
        chanfro2.Add(CHANFRO2_SIZE, CHANFRO2_SIZE2, e.wrapped, chanfro2_side_5[0].wrapped)  # the first distance lies on this face
    for e in chanfro2_edges_6:
        chanfro2.Add(CHANFRO2_SIZE, CHANFRO2_SIZE2, e.wrapped, chanfro2_side_6[0].wrapped)  # the first distance lies on this face
    for e in chanfro2_edges_7:
        chanfro2.Add(CHANFRO2_SIZE, CHANFRO2_SIZE2, e.wrapped, chanfro2_side_7[0].wrapped)  # the first distance lies on this face
    for e in chanfro2_edges_8:
        chanfro2.Add(CHANFRO2_SIZE, CHANFRO2_SIZE2, e.wrapped, chanfro2_side_8[0].wrapped)  # the first distance lies on this face
    add(Compound.cast(chanfro2.Shape()), mode=Mode.REPLACE)


solid = part.part
